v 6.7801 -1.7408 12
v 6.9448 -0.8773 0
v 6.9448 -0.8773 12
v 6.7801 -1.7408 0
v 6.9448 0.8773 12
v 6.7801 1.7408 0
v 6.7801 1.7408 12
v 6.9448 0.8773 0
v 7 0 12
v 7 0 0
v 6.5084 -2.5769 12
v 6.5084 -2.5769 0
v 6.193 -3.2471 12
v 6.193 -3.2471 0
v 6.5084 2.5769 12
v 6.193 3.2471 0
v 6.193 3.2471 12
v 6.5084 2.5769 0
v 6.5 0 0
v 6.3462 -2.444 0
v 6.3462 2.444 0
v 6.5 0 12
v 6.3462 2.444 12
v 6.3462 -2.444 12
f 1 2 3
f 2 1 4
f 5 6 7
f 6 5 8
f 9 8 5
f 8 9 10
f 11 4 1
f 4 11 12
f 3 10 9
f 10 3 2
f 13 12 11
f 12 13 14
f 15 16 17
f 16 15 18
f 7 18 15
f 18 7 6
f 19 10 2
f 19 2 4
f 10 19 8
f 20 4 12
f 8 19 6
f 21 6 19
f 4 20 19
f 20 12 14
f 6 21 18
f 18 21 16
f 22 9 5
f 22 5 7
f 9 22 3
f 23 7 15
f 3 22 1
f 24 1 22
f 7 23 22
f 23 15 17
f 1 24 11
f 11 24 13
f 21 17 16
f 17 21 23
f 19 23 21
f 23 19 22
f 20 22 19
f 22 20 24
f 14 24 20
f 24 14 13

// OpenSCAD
$fn = 50;


difference() {
	union() {
		cylinder(h = 12, r = 7.0000000000);
		translate(v = [-16.0000000000, 0, 0]) {
			cylinder(h = 12, r = 7.0000000000);
		}
	}
	union() {
		cylinder(h = 12, r = 3.2500000000);
		cylinder(h = 12, r = 1.8000000000);
		cylinder(h = 12, r = 1.8000000000);
		cylinder(h = 12, r = 1.8000000000);
		translate(v = [-20.5000000000, 0, 0]) {
			hull() {
				translate(v = [-3.7500000000, 0.0000000000, 0]) {
					cylinder(h = 12, r = 10.5000000000);
				}
				translate(v = [3.7500000000, 0.0000000000, 0]) {
					cylinder(h = 12, r = 10.5000000000);
				}
				translate(v = [-3.7500000000, -0.0000000000, 0]) {
					cylinder(h = 12, r = 10.5000000000);
				}
				translate(v = [3.7500000000, -0.0000000000, 0]) {
					cylinder(h = 12, r = 10.5000000000);
				}
			}
		}
		translate(v = [-13.0000000000, 0, 0.0000000000]) {
			cylinder(h = 12, r = 19.5000000000);
		}
	}
}
